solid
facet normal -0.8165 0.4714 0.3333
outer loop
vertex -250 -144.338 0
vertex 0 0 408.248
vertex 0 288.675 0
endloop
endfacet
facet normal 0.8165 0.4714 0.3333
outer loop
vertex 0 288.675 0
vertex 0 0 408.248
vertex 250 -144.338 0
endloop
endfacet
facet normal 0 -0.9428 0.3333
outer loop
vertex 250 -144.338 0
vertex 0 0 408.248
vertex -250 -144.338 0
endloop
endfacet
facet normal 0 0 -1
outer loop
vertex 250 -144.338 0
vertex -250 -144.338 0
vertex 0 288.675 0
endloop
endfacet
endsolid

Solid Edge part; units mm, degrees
sketch "Sketch1" plane through (0, 0, 0) normal (0, 0, 1) x (1, 0, 0)
  line L0 (-250, -144.3376) -> (250, -144.3376)
  line L1 (250, -144.3376) -> (0, 288.6751)
  line L2 (0, 288.6751) -> (-250, -144.3376)
extrude "Protrusion1" add sketch "Sketch1" along normal up to vertex (408.2483 mm away)
sketch "Sketch2" plane through (0, 0, 0) normal (1, 0, 0) x (0, 1, 0)
  line L0 (0, 408.2483) -> (-144.3376, 0)
extrude "Cutout1" cut sketch "Sketch2" against normal up to next and the other way up to next material side at (0, -72.2159, 204.1408)
pattern_circular "Pattern1" count 3 over 360 about axis through (0, 0, 408.2483) along (0, 0, -1) of "Cutout1"
